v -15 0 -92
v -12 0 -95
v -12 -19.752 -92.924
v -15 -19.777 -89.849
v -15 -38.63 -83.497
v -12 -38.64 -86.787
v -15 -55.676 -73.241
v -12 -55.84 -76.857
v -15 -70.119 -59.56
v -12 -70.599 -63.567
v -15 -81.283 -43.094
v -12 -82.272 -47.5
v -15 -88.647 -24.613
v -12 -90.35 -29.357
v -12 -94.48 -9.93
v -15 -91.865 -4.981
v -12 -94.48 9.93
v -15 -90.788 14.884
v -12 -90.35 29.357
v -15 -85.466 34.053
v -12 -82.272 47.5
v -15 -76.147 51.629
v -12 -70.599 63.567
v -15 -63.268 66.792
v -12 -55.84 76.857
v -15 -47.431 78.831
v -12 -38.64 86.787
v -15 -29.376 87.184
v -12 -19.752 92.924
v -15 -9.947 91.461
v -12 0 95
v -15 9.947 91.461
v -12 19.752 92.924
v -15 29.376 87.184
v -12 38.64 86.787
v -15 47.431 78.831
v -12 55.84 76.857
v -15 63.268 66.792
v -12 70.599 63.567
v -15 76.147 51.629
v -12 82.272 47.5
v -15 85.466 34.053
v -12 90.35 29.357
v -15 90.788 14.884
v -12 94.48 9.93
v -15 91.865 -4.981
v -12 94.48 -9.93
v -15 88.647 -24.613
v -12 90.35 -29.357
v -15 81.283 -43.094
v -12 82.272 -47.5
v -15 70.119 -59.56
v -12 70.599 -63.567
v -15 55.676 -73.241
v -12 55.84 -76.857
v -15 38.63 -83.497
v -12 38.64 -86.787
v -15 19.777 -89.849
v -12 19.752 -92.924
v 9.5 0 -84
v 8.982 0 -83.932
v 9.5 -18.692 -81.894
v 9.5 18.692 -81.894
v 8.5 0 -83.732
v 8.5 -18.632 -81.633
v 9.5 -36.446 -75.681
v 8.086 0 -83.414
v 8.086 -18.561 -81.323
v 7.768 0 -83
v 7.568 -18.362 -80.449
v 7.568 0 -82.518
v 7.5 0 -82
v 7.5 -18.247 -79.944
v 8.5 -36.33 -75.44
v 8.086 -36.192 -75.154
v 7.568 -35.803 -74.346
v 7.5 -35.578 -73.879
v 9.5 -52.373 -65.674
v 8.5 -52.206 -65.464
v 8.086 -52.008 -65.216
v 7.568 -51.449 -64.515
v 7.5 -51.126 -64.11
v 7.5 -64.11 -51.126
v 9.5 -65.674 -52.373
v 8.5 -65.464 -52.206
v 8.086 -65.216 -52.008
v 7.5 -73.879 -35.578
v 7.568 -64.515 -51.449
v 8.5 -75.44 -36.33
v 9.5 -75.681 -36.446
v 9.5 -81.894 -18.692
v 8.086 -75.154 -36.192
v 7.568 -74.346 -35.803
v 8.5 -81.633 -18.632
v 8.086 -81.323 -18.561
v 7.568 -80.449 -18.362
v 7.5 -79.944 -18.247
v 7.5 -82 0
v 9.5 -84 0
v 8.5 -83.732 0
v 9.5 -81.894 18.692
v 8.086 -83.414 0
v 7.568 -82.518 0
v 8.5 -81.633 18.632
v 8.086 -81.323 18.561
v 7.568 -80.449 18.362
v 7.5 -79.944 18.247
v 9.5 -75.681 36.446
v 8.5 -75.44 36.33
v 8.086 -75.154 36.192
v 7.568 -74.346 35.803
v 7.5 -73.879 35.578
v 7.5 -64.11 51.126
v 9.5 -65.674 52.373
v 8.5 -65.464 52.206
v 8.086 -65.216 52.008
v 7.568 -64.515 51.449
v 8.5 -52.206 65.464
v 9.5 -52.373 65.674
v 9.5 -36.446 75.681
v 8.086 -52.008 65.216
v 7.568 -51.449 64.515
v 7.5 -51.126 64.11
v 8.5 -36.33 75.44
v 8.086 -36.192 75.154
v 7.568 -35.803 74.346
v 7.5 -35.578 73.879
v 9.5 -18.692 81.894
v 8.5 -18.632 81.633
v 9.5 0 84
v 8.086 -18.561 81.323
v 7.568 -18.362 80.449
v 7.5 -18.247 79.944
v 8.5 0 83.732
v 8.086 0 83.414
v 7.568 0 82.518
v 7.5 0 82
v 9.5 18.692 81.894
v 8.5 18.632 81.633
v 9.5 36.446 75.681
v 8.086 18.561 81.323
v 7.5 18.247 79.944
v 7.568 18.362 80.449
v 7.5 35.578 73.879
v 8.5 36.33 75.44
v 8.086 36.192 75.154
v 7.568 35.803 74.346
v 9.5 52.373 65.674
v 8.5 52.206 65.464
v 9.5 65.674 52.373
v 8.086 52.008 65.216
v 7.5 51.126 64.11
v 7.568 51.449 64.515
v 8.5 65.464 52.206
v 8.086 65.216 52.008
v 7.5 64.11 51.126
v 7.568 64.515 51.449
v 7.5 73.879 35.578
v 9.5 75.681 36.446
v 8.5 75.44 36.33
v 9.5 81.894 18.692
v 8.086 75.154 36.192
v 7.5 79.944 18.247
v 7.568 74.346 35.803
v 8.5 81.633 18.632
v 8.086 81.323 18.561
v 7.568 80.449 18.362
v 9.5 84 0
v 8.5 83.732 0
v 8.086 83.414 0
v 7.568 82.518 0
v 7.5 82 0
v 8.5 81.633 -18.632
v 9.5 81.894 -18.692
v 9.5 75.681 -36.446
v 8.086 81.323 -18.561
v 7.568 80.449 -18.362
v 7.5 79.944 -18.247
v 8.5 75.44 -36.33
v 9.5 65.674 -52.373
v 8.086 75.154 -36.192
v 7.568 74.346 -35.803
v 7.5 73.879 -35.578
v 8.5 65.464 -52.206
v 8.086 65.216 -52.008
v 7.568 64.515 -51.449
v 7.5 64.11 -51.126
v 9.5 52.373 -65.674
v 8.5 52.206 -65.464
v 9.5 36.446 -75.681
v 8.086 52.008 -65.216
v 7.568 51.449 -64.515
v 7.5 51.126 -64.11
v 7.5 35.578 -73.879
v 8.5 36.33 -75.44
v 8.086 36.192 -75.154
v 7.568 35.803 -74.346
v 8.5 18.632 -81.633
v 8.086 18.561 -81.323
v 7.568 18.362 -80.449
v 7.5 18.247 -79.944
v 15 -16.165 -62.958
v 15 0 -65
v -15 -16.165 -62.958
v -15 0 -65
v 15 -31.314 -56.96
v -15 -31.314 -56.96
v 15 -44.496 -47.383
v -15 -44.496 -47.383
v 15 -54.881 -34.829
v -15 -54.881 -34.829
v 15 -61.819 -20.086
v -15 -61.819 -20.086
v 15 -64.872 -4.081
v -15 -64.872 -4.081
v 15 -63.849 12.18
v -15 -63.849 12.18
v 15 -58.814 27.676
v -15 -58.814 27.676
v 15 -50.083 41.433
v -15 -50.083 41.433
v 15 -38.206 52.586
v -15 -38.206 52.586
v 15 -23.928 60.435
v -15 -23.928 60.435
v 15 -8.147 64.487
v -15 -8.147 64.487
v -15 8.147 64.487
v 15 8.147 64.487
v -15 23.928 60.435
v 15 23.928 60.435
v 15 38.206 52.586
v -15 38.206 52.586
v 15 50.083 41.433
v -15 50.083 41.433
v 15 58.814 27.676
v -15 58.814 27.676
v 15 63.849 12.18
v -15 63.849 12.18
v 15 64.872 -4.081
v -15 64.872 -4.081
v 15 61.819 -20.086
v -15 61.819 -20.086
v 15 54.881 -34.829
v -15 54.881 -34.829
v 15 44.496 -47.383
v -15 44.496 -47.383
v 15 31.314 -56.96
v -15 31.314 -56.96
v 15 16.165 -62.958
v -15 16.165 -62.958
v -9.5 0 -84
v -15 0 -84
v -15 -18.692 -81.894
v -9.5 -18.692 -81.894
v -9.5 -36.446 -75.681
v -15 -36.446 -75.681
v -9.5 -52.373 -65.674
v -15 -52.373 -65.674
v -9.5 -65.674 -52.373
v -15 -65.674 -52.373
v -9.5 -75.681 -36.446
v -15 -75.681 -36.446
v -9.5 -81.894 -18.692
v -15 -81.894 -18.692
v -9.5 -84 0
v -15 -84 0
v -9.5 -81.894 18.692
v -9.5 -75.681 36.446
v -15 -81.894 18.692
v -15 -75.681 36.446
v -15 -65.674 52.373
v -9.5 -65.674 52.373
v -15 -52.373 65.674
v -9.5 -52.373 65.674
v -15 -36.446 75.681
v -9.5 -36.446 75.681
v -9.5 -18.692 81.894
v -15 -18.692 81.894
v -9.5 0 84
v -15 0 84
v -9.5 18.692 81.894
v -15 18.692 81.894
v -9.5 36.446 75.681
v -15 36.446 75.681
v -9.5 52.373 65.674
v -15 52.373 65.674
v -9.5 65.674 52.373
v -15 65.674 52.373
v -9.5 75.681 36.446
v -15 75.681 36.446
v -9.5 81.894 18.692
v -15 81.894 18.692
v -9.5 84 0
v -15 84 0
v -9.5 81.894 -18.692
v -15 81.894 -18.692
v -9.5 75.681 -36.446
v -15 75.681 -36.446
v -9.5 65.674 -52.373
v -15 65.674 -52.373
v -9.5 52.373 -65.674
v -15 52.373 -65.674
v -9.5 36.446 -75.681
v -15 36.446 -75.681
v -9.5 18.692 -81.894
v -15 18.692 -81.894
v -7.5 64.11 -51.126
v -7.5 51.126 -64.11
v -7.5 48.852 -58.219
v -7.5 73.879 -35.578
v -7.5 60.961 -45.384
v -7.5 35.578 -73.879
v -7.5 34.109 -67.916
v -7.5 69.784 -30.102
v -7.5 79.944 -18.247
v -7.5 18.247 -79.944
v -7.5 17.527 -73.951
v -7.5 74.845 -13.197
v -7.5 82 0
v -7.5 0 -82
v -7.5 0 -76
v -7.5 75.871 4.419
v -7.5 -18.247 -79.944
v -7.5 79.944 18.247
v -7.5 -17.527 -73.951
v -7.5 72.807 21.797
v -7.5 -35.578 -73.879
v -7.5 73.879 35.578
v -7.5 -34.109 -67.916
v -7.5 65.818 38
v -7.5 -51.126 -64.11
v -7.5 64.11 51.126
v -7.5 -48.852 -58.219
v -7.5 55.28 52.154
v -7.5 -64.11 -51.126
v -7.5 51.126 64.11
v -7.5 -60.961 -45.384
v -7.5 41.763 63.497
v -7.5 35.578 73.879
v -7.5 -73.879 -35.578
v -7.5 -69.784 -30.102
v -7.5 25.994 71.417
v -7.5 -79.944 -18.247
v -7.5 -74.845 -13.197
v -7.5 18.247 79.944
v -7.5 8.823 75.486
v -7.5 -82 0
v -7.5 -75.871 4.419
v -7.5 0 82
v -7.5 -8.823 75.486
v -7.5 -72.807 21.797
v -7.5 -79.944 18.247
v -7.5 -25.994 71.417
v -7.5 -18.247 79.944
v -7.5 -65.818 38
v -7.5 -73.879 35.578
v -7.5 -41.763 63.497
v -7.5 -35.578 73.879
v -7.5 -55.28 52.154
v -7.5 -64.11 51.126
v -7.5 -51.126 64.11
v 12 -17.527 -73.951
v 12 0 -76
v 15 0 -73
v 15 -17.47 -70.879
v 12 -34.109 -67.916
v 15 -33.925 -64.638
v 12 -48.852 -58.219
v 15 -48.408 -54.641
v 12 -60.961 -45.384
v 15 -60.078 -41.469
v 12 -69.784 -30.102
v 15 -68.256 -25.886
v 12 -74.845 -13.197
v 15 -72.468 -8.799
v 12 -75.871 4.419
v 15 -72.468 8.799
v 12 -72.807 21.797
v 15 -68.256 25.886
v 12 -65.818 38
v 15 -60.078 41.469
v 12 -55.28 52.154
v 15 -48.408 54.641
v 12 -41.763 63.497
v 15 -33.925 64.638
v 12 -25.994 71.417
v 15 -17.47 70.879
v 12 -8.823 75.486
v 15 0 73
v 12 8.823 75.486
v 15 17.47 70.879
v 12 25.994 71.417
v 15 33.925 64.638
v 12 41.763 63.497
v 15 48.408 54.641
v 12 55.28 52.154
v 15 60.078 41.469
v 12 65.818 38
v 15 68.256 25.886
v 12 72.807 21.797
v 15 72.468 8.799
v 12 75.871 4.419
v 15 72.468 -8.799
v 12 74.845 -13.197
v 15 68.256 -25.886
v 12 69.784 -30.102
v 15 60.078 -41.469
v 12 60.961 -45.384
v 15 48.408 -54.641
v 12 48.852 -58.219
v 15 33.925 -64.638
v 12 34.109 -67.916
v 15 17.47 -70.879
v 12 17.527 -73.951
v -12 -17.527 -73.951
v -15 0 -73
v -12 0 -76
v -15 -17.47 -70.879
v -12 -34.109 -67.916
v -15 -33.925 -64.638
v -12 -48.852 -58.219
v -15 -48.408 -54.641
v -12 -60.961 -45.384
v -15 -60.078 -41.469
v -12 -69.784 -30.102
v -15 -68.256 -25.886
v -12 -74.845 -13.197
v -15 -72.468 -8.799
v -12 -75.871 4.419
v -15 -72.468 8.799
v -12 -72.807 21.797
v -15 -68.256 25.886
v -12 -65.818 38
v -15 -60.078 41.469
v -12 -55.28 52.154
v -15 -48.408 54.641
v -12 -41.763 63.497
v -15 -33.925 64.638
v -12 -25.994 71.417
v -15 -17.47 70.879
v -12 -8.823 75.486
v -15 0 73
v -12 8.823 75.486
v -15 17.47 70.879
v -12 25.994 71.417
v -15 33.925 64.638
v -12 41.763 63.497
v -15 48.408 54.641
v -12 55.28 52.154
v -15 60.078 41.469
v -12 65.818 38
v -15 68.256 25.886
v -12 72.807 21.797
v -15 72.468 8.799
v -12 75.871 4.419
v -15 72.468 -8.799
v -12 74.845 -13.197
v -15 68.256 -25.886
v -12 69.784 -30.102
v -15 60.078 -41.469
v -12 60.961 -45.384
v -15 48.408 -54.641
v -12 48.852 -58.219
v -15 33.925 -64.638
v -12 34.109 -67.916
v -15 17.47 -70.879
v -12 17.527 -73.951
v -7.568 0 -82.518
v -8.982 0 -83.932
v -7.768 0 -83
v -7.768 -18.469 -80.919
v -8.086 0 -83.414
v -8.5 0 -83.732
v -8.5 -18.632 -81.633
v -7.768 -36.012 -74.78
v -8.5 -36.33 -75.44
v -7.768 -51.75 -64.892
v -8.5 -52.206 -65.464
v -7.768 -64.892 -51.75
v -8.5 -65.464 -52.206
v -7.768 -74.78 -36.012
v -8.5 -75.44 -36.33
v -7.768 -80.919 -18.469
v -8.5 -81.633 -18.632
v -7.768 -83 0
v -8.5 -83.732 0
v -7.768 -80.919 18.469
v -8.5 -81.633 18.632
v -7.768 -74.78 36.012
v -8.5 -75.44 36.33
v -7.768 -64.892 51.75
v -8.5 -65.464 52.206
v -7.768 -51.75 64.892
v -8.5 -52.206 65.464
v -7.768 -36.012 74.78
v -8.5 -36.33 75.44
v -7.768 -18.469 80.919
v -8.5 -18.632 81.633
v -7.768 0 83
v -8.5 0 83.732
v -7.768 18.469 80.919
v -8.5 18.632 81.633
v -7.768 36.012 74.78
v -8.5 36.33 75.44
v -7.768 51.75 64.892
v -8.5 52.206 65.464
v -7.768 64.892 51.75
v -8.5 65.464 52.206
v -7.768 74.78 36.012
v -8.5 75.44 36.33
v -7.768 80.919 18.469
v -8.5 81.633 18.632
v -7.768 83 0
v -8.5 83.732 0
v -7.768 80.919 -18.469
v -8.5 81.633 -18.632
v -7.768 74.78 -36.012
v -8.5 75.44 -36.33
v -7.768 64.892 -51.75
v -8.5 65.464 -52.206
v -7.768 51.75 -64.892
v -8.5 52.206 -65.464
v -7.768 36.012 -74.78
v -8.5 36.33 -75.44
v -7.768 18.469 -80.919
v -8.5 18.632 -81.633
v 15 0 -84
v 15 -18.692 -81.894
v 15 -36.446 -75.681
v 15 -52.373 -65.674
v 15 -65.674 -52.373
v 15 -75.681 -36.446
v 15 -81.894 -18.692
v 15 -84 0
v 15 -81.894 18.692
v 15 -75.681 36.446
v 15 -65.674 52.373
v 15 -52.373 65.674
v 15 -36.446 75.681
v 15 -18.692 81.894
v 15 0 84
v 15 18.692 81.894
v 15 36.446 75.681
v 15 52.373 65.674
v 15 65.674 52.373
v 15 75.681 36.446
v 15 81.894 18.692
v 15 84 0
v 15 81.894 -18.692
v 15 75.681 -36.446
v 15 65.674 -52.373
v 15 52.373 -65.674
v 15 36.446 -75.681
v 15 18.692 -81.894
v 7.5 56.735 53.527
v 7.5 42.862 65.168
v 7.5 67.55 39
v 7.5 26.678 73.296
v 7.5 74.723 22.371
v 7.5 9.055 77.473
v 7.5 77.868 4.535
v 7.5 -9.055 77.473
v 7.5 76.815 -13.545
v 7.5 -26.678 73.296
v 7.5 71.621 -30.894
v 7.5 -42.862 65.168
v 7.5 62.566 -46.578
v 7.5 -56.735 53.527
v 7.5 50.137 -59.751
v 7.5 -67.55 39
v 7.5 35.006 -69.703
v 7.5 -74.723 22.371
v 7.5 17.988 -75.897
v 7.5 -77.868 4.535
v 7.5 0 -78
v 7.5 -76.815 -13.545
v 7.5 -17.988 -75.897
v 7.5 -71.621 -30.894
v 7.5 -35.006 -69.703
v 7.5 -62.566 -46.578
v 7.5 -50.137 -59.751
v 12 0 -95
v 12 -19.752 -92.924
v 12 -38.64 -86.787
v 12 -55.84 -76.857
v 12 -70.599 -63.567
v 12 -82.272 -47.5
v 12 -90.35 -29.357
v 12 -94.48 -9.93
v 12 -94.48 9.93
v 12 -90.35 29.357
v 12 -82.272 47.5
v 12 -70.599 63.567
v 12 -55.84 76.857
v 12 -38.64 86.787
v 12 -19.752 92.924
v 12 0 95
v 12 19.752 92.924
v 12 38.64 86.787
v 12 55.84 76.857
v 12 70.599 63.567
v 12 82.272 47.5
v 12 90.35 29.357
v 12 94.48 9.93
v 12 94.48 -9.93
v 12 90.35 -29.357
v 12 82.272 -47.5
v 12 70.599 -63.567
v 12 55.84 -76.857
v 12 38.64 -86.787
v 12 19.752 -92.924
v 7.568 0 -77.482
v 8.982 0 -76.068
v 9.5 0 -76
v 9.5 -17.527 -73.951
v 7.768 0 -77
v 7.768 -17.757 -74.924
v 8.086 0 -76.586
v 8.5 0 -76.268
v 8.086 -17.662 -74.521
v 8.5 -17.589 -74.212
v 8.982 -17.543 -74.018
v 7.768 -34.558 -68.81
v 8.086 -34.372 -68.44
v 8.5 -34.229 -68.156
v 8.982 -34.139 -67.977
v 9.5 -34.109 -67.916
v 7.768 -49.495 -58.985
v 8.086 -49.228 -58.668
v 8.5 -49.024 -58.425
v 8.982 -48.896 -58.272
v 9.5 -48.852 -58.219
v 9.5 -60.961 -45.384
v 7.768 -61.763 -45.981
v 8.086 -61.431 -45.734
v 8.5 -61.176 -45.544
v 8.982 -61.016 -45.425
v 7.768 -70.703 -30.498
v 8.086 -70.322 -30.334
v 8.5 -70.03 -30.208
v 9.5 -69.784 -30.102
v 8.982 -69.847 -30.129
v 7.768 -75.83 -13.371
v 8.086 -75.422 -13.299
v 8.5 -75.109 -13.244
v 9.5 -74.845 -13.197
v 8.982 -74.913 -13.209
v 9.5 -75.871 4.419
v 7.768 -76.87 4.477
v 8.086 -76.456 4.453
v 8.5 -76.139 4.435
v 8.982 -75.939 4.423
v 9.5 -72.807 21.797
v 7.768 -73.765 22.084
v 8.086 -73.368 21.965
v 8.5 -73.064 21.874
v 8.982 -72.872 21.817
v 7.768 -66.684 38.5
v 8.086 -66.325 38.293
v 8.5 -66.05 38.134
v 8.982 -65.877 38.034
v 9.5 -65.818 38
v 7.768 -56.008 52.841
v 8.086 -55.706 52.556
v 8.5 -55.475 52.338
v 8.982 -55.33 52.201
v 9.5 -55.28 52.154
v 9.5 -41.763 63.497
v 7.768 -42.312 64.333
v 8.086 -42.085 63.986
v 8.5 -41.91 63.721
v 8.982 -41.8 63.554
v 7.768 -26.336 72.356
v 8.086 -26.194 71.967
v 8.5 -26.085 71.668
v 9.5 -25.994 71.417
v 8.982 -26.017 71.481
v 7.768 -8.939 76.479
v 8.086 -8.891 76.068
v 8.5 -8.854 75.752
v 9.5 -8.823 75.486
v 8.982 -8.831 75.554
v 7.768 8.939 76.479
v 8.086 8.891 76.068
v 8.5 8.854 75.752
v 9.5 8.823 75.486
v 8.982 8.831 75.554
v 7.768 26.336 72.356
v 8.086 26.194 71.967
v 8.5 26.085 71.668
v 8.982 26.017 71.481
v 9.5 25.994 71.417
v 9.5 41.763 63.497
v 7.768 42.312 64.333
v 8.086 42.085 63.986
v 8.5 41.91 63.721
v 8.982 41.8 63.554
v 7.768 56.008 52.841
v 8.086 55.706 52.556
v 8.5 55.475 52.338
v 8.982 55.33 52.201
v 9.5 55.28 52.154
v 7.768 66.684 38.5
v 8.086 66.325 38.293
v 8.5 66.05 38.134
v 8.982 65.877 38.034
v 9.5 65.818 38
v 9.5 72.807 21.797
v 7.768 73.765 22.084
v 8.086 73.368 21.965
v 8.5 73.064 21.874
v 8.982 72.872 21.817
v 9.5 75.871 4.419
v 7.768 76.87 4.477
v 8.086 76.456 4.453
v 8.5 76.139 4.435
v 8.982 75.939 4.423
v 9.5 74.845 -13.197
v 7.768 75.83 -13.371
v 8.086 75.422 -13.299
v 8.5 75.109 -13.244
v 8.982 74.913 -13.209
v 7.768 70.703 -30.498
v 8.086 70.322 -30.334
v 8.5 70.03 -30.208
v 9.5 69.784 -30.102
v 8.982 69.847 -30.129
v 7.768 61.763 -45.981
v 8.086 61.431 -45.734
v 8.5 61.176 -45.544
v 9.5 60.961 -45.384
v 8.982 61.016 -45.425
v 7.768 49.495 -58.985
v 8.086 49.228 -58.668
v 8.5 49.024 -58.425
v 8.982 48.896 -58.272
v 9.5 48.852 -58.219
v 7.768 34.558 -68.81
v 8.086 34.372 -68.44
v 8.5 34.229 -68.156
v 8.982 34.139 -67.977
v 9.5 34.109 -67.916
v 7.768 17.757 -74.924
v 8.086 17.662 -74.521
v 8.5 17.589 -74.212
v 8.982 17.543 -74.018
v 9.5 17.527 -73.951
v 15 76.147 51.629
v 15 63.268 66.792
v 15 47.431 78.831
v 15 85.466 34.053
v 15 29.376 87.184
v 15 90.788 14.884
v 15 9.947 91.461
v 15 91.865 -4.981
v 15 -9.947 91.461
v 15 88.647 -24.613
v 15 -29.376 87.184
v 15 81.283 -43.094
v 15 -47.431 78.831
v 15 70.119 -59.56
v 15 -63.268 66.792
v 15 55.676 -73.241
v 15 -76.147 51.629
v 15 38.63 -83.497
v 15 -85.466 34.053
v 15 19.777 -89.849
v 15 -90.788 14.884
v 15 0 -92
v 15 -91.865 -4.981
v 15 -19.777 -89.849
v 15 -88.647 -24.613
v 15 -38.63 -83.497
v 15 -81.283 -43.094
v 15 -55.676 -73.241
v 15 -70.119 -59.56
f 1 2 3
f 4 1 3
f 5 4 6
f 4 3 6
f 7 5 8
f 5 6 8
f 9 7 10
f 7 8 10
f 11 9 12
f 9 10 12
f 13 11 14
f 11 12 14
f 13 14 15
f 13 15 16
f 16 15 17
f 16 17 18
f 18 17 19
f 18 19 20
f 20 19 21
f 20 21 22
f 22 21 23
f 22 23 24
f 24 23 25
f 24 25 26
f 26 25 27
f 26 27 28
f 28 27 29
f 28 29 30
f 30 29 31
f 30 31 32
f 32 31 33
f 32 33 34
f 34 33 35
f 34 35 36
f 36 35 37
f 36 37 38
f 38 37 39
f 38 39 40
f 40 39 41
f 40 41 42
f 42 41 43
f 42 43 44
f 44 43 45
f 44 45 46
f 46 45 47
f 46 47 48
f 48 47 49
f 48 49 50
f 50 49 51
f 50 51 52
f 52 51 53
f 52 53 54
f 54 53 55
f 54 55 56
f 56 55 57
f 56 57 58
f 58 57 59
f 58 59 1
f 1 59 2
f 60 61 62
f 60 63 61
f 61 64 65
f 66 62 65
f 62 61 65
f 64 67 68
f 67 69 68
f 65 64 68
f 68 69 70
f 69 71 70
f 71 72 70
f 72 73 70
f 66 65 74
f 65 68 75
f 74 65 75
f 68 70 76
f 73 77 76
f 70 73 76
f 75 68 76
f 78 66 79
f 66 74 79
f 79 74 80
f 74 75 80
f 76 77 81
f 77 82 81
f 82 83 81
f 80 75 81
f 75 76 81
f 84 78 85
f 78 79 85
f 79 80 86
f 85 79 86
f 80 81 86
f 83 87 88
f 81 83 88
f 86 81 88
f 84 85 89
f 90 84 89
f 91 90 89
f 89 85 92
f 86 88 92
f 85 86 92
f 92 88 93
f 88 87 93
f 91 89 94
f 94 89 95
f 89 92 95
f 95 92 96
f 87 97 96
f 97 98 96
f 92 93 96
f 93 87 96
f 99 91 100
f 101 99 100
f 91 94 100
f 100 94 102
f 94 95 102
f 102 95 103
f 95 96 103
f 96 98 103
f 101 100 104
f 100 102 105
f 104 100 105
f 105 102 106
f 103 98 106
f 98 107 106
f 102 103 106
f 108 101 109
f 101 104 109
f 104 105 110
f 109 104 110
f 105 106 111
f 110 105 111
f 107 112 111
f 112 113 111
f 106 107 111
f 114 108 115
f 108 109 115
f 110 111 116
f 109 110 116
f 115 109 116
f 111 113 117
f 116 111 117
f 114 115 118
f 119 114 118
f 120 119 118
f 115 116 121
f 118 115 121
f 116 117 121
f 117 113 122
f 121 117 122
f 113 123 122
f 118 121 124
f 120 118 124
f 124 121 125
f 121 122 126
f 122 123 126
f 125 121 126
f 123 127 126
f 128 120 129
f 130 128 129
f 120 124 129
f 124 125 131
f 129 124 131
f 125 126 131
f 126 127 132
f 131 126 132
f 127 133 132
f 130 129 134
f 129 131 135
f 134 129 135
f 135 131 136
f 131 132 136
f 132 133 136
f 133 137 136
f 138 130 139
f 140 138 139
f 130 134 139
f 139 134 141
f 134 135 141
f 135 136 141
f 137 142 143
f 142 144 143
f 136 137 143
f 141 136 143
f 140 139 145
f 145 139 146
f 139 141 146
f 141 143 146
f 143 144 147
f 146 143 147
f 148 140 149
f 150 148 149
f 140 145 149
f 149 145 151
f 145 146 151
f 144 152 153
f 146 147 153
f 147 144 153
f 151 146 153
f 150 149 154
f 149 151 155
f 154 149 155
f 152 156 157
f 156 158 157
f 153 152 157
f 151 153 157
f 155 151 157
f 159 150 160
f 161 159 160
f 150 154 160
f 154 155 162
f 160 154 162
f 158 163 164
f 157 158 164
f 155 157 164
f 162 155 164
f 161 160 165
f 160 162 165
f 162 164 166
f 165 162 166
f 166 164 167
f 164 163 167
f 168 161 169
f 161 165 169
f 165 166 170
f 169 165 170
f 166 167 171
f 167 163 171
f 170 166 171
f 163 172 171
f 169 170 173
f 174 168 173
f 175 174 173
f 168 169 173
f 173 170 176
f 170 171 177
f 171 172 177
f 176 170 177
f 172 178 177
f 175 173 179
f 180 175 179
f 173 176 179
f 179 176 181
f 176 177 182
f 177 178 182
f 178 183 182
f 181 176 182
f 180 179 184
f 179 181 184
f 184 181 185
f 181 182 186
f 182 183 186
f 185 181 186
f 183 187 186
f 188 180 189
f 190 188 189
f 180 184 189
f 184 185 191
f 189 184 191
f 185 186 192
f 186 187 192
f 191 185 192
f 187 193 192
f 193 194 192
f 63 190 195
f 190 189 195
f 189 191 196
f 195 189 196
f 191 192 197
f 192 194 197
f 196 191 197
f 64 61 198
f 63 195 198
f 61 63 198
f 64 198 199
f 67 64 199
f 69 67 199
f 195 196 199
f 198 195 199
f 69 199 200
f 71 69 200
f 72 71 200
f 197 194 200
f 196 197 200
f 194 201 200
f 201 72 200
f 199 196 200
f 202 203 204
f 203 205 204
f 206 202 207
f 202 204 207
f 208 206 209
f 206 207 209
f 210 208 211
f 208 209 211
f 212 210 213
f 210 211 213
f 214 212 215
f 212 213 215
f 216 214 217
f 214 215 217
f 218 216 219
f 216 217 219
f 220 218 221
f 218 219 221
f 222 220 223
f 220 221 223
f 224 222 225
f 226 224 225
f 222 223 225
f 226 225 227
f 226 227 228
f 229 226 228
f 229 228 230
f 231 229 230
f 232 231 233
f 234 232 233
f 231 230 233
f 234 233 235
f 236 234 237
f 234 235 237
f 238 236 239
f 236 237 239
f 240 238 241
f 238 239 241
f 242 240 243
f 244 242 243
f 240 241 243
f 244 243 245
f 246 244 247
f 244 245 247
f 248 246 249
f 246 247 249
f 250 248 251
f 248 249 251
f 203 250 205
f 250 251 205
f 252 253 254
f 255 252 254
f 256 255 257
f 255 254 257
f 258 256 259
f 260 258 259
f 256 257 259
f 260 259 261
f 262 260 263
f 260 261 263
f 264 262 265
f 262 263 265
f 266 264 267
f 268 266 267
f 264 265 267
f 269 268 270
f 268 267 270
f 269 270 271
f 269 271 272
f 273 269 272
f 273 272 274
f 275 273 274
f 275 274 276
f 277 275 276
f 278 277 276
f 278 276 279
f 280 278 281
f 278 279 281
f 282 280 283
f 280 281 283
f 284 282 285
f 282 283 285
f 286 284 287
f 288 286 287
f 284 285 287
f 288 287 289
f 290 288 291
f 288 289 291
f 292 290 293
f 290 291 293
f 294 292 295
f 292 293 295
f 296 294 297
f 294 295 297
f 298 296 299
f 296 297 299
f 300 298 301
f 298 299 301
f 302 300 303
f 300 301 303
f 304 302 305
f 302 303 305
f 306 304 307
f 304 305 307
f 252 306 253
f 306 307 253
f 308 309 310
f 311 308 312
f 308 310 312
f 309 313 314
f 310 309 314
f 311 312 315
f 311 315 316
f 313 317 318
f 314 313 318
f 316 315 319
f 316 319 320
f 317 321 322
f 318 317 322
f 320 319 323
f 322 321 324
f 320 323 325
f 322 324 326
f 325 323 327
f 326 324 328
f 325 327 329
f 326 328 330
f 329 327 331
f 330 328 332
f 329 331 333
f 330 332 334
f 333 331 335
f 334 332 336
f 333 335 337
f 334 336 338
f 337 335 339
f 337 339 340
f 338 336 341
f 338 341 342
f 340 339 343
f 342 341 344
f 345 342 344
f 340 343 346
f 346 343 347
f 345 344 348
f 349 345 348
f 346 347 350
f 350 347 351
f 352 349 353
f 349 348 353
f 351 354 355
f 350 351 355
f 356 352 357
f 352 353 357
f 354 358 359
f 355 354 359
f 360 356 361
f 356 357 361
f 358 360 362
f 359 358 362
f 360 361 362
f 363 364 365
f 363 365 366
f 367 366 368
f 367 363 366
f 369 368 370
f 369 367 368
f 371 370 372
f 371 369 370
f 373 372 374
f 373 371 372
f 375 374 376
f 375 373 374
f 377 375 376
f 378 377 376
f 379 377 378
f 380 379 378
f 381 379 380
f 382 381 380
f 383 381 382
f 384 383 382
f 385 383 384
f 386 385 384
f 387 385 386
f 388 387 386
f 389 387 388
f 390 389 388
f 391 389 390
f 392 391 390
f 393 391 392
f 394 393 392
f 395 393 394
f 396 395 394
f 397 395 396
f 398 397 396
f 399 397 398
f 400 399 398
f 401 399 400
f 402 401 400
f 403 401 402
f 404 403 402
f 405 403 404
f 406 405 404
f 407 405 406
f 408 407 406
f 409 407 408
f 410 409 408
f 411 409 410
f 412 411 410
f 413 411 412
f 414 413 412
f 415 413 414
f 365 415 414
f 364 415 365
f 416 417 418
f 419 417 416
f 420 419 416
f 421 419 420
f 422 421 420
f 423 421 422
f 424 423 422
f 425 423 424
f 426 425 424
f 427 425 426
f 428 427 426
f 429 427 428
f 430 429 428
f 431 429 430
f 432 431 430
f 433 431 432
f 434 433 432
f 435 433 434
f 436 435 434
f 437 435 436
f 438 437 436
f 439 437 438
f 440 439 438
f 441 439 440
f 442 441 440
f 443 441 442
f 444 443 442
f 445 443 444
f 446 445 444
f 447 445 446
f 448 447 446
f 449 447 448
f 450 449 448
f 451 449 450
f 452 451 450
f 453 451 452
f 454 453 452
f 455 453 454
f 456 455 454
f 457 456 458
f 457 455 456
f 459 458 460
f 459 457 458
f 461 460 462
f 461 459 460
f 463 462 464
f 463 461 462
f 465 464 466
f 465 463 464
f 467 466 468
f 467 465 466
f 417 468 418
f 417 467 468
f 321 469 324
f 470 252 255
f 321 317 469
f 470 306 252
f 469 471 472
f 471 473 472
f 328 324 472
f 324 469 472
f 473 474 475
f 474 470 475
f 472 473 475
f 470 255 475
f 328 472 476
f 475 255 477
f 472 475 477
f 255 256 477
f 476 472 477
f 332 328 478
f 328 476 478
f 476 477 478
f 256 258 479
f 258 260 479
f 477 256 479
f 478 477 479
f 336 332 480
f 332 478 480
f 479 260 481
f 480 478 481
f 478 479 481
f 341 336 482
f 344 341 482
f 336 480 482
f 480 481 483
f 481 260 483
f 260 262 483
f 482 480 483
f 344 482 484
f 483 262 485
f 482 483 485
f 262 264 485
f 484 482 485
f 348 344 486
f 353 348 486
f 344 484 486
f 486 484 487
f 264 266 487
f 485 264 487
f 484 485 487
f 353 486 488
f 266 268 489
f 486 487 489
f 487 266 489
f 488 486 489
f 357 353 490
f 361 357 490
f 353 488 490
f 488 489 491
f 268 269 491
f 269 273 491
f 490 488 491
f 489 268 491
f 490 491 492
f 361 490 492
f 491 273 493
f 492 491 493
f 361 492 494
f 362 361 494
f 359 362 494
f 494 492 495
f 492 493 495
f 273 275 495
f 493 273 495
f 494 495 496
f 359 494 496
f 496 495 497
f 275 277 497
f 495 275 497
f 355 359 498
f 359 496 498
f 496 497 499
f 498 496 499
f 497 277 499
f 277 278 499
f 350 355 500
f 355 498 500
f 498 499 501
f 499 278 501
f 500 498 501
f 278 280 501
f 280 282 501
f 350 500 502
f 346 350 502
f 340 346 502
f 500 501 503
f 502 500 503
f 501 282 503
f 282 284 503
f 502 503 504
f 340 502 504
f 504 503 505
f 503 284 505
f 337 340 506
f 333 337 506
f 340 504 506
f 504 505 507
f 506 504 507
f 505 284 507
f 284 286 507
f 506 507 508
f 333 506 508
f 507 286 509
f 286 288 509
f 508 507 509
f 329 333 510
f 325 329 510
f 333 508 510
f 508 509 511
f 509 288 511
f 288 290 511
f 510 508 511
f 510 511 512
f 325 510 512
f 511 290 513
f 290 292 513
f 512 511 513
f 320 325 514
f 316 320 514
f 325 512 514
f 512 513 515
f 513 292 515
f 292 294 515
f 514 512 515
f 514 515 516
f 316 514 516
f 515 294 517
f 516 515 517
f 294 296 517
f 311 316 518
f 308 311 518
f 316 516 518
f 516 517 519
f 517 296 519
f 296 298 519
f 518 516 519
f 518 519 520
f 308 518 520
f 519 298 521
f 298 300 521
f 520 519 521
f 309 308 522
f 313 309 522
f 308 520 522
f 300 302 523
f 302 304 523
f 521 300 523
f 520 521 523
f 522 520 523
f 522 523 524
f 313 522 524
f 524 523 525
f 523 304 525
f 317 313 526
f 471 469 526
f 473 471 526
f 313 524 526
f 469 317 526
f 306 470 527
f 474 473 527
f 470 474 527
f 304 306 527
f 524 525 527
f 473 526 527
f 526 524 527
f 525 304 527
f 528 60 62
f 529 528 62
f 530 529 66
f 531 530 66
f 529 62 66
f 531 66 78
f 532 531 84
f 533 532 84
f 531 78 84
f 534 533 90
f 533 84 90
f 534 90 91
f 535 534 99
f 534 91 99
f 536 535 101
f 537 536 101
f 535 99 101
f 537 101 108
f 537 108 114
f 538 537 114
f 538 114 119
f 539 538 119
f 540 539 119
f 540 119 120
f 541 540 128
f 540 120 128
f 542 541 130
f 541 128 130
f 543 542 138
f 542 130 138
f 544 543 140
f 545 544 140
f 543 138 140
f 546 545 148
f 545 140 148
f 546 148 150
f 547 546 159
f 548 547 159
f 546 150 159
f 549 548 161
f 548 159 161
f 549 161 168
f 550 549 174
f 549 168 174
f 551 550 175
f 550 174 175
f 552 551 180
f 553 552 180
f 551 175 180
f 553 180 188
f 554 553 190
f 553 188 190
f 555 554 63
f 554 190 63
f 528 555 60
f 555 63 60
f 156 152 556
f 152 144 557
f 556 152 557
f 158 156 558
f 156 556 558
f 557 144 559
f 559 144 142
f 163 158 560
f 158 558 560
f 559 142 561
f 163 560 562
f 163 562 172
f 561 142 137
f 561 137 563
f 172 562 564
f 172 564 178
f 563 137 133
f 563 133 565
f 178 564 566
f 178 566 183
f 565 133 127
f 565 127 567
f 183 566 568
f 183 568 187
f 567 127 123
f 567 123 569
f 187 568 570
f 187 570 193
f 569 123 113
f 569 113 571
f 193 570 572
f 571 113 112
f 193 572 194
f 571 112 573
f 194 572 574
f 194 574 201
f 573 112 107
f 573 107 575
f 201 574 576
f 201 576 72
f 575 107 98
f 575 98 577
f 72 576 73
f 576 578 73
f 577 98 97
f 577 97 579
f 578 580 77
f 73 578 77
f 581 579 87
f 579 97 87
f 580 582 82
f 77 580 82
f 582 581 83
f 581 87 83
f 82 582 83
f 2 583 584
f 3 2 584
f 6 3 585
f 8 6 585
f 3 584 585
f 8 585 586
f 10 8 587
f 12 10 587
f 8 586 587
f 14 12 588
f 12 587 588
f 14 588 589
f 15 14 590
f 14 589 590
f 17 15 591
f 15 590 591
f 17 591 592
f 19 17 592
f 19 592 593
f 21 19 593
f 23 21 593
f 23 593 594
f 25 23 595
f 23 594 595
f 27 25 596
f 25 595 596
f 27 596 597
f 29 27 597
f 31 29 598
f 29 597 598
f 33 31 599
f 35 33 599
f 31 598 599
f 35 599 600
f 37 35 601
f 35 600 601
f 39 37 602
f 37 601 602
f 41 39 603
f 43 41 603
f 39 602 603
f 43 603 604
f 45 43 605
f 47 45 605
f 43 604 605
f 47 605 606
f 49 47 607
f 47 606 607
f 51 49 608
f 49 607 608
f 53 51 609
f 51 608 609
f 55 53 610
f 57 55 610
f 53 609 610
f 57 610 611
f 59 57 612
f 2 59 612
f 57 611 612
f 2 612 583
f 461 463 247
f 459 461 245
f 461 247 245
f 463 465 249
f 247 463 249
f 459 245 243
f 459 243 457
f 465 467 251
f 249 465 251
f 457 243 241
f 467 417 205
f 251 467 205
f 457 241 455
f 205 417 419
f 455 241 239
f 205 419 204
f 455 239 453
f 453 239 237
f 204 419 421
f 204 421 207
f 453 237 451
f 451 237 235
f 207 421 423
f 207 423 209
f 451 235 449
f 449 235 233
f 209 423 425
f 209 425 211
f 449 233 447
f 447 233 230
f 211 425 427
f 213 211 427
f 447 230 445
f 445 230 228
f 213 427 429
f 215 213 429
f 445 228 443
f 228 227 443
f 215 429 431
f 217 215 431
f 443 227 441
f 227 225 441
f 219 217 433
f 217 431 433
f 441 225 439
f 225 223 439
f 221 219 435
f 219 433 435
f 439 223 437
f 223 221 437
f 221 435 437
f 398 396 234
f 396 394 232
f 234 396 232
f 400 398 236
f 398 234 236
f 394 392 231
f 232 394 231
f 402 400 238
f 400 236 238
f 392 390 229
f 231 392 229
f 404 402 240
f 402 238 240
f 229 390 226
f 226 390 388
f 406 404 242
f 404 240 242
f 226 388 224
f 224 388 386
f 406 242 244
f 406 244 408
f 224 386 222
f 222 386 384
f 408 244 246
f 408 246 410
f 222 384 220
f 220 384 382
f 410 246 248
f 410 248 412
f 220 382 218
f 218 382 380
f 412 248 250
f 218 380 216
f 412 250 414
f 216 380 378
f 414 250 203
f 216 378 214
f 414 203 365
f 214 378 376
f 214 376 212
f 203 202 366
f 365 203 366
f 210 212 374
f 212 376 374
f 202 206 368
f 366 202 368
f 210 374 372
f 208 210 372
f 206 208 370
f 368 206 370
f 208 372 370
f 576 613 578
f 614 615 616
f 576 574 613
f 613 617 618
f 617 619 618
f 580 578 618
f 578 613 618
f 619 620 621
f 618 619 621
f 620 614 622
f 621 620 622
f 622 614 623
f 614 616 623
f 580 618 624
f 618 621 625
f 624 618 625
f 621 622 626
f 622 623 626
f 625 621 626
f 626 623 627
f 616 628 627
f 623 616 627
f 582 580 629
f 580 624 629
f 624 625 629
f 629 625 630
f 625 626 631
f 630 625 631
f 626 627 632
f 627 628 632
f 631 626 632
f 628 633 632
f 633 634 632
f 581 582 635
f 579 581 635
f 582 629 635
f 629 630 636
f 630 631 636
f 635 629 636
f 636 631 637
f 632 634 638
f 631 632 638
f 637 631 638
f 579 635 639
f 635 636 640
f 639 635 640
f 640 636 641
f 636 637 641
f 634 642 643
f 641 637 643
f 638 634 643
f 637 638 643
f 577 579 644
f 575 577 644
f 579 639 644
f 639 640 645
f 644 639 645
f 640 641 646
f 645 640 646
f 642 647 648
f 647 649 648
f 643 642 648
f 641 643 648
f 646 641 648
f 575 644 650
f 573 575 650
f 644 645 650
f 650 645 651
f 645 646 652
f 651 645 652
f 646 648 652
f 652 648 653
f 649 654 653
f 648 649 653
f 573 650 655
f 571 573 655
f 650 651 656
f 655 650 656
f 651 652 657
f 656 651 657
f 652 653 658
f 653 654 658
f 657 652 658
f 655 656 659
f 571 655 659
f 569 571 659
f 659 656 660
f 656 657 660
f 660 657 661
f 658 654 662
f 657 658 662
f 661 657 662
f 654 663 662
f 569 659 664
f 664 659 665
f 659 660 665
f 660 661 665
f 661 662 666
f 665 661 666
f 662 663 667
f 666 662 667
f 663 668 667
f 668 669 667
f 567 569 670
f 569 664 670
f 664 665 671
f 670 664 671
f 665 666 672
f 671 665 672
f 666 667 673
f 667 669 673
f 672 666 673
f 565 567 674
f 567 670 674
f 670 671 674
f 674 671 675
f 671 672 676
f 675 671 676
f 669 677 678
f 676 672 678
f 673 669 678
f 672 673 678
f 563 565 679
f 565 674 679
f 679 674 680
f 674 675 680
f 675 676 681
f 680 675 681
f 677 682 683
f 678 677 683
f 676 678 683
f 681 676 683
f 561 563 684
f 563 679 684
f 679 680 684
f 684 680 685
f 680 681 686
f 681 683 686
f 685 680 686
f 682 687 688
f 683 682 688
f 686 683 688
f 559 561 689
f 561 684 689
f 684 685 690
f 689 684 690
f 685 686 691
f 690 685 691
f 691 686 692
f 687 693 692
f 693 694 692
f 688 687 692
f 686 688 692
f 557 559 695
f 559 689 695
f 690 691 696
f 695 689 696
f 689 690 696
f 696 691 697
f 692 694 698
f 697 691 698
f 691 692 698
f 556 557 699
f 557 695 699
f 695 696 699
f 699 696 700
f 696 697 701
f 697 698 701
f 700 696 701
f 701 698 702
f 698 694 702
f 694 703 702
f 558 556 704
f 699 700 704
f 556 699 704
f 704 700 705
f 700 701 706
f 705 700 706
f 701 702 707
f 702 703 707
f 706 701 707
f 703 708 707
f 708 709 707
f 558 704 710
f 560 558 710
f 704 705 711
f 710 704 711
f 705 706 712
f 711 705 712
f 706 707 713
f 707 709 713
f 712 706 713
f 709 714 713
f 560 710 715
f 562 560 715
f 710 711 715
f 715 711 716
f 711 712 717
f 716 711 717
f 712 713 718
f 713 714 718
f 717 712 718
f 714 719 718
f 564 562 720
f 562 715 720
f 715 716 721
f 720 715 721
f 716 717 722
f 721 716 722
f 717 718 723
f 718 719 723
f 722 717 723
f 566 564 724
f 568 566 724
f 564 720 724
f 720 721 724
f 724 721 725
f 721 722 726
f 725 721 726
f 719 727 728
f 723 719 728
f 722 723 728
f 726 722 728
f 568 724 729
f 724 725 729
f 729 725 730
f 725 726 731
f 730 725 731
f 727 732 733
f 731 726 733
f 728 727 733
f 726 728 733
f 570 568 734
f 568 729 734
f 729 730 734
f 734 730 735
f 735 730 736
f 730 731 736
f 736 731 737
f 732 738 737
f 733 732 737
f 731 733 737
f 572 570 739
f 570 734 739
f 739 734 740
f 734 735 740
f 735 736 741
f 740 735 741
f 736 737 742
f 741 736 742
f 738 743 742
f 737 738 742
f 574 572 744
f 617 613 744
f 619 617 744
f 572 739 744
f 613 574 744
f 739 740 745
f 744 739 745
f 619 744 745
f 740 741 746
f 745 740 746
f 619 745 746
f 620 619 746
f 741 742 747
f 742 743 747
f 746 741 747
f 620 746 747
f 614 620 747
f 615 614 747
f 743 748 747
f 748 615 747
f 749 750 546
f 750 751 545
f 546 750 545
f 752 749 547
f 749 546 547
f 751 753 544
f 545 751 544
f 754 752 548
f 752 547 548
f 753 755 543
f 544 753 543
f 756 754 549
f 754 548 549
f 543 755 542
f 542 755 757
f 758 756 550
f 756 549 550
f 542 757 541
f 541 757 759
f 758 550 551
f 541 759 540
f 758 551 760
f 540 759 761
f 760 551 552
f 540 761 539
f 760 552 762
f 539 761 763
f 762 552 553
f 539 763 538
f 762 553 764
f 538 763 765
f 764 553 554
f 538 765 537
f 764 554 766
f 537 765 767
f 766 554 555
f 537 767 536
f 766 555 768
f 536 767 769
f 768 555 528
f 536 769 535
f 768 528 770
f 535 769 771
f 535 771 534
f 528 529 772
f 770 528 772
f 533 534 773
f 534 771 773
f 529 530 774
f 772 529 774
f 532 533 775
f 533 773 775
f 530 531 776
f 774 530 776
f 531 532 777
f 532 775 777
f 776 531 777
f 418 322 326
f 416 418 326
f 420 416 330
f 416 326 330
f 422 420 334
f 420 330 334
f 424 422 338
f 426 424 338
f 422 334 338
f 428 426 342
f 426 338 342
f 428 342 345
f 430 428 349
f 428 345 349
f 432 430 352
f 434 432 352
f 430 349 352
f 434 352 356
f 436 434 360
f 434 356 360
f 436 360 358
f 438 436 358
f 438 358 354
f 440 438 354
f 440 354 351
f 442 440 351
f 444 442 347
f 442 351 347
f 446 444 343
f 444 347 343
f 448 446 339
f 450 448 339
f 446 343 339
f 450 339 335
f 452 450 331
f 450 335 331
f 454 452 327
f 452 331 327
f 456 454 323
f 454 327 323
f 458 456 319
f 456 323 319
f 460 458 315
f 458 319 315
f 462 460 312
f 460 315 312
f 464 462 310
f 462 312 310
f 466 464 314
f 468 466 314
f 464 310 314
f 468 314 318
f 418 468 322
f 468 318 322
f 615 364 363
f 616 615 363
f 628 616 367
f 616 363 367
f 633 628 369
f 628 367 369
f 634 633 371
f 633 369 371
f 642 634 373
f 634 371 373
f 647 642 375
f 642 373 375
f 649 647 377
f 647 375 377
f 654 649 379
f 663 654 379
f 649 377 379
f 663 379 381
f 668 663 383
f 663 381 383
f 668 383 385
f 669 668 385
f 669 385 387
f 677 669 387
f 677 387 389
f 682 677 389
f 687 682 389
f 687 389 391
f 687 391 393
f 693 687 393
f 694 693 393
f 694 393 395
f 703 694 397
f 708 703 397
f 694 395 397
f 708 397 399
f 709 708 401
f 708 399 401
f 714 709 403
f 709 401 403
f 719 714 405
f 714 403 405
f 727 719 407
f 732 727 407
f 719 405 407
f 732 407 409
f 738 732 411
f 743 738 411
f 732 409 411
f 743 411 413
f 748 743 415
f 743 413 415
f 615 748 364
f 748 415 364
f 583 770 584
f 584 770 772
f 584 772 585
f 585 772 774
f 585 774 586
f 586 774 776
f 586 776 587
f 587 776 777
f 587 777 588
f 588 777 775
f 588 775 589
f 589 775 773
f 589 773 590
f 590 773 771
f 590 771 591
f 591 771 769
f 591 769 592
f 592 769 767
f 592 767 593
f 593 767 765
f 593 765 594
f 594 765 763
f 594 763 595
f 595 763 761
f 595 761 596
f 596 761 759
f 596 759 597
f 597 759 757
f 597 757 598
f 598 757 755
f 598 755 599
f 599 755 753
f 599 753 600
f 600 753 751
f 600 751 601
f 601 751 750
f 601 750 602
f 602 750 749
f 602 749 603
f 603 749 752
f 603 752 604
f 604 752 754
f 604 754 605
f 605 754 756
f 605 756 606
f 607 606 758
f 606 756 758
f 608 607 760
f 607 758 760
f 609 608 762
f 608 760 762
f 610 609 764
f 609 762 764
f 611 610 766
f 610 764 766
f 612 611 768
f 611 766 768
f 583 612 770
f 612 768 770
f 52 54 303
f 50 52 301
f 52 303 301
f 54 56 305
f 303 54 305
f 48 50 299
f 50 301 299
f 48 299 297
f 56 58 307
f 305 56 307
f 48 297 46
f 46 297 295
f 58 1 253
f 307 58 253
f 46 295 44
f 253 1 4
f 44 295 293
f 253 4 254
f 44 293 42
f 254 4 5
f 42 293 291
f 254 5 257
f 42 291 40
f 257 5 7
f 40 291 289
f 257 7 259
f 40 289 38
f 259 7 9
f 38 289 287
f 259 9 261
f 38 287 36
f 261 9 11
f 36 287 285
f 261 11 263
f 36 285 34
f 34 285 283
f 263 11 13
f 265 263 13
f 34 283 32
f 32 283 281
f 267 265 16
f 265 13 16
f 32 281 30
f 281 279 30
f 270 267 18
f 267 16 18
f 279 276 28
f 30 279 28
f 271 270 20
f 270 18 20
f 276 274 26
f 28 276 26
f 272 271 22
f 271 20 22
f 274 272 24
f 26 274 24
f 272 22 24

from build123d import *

# Parameters (mm, degrees)
ZAOKR_GLENIE2_R  = 2
SFAZOWANIE1_SIZE = 3


with BuildPart() as part:
    # Szkic1 → Obrót1 (revolve)
    with BuildSketch(Plane(origin=(0, 0, 0), x_dir=(1, 0, 0), z_dir=(0, 1, 0))):
        Polygon((15, 65), (-15, 65), (-15, 76), (-7.5, 76), (-7.5, 84), (-15, 84), (-15, 95), (15, 95), (15, 84), (7.5, 84), (7.5, 76), (15, 76), align=None)
    revolve(axis=Axis((0, 0, 0), (-1, 0, 0)))

    # Zaokrąglenie2
    zaokr_glenie2_edges = [part.edges().sort_by_distance(p)[0] for p in [
        (-7.5, 0, 84),
        (7.5, 0, 84),
        (7.5, 0, 76),
    ]]
    fillet(zaokr_glenie2_edges, radius=ZAOKR_GLENIE2_R)

    # Sfazowanie1
    sfazowanie1_edges = [part.edges().sort_by_distance(p)[0] for p in [
        (15, 0, 76),
        (-15, 0, 76),
        (-15, 0, 95),
        (15, 0, 95),
    ]]
    chamfer(sfazowanie1_edges, length=SFAZOWANIE1_SIZE)


solid = part.part
